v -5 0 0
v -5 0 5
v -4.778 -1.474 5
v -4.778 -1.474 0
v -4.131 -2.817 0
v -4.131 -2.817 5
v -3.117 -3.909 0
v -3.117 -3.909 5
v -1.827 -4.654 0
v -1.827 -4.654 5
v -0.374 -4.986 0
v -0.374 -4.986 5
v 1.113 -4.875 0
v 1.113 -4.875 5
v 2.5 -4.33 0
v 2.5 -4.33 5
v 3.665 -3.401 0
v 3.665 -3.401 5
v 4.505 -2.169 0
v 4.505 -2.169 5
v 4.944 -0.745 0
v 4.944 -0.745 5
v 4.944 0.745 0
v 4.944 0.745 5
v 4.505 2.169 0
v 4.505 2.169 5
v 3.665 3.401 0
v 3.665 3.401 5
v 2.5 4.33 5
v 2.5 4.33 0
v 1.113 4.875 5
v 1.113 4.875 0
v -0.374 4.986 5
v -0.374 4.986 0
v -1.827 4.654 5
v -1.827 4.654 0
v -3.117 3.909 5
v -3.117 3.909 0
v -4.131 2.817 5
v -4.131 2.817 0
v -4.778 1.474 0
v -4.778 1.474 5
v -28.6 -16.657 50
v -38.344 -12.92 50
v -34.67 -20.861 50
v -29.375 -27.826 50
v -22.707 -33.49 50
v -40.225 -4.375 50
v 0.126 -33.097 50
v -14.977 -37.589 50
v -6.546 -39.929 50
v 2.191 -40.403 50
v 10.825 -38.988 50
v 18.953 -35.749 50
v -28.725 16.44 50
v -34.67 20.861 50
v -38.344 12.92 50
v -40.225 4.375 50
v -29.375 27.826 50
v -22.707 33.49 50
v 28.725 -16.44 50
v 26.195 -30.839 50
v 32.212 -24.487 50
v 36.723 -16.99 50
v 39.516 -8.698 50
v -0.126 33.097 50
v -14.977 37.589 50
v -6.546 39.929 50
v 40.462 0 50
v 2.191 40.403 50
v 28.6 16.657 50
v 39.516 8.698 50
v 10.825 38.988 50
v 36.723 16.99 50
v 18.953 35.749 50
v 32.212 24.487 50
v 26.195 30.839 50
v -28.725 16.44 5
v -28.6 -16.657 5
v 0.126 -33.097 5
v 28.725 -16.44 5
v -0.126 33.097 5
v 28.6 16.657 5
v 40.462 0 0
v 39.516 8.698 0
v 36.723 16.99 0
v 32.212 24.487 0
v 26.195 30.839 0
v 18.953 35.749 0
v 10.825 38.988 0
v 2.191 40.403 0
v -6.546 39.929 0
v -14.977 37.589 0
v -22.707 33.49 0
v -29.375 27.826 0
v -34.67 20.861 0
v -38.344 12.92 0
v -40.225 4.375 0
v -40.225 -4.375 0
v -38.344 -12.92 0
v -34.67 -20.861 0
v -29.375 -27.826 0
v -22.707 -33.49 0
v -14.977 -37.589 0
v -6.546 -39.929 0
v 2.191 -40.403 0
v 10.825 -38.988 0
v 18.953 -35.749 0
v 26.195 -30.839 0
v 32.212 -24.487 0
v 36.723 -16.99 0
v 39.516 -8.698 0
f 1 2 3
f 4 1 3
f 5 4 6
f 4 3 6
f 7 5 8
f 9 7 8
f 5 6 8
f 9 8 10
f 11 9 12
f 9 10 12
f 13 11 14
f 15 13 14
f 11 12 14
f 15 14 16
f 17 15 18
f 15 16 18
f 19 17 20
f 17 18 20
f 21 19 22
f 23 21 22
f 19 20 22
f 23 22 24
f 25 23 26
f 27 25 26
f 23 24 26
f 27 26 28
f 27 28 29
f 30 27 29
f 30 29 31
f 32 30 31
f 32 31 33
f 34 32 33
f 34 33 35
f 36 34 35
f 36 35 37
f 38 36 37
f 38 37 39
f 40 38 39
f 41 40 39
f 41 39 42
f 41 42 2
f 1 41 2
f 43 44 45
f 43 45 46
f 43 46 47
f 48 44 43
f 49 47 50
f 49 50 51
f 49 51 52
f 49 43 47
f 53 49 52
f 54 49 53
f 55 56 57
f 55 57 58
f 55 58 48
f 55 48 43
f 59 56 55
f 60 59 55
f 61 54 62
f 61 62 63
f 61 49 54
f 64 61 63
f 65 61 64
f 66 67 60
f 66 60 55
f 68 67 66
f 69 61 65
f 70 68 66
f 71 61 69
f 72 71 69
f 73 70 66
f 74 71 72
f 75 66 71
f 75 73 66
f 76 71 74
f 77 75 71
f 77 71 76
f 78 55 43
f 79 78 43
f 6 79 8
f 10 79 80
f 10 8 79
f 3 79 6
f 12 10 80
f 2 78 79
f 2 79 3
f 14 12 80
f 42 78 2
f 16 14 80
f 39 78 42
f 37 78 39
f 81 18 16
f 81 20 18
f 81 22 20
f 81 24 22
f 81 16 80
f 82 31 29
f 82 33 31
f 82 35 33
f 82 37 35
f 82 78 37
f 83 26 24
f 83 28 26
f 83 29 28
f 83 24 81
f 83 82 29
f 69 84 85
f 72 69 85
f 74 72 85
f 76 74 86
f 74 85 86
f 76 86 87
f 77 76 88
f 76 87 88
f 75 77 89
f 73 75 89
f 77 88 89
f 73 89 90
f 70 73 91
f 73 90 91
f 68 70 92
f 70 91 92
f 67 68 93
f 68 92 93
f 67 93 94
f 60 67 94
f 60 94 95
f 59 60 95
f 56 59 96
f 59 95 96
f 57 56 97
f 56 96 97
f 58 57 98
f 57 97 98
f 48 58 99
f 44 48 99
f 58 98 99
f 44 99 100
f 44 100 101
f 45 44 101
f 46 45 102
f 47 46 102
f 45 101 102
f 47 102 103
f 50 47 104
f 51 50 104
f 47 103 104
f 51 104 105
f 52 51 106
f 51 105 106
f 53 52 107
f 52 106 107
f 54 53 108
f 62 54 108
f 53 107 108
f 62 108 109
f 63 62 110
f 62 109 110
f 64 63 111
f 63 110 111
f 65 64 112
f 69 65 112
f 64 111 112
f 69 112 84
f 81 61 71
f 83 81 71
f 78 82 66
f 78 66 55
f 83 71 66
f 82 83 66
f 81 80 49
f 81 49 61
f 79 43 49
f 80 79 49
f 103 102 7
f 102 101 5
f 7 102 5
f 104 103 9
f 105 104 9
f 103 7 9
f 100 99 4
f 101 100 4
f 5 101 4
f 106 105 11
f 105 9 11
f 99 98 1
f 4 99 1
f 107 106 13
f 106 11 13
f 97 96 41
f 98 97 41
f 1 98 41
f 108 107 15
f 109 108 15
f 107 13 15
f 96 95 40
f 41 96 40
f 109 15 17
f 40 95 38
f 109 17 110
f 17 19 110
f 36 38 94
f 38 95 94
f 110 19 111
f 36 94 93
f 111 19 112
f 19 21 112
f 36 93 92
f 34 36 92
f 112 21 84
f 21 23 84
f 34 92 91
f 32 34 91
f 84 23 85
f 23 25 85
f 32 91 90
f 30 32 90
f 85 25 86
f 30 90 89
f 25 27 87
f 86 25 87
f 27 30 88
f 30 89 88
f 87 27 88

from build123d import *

# Parameters (mm, degrees)
F0_R     = 40.462362
F1_DEPTH = 50
F3_DEPTH = 45
F5_D     = 10


with BuildPart() as f1:
    # F0 (on Top) → F1 (new body)
    with BuildSketch(Plane.XY):
        Circle(F0_R)
    extrude(amount=F1_DEPTH)

    # F2 (on face) → F3 (cut)
    with BuildSketch(Plane.XY.offset(50)):
        Polygon((-0.125509, 33.096657), (-28.7253, 16.439635), (-28.599791, -16.657022), (0.125509, -33.096657), (28.7253, -16.439635), (28.599791, 16.657022), align=None)
    extrude(amount=-F3_DEPTH, mode=Mode.SUBTRACT)

    # F5 (through all)
    with Locations(Plane(origin=(0, 0, 0), x_dir=(1, 0, 0), z_dir=(0, 0, -1))):
        with Locations((0, 0)):
            Hole(F5_D / 2)


solid = f1.part
